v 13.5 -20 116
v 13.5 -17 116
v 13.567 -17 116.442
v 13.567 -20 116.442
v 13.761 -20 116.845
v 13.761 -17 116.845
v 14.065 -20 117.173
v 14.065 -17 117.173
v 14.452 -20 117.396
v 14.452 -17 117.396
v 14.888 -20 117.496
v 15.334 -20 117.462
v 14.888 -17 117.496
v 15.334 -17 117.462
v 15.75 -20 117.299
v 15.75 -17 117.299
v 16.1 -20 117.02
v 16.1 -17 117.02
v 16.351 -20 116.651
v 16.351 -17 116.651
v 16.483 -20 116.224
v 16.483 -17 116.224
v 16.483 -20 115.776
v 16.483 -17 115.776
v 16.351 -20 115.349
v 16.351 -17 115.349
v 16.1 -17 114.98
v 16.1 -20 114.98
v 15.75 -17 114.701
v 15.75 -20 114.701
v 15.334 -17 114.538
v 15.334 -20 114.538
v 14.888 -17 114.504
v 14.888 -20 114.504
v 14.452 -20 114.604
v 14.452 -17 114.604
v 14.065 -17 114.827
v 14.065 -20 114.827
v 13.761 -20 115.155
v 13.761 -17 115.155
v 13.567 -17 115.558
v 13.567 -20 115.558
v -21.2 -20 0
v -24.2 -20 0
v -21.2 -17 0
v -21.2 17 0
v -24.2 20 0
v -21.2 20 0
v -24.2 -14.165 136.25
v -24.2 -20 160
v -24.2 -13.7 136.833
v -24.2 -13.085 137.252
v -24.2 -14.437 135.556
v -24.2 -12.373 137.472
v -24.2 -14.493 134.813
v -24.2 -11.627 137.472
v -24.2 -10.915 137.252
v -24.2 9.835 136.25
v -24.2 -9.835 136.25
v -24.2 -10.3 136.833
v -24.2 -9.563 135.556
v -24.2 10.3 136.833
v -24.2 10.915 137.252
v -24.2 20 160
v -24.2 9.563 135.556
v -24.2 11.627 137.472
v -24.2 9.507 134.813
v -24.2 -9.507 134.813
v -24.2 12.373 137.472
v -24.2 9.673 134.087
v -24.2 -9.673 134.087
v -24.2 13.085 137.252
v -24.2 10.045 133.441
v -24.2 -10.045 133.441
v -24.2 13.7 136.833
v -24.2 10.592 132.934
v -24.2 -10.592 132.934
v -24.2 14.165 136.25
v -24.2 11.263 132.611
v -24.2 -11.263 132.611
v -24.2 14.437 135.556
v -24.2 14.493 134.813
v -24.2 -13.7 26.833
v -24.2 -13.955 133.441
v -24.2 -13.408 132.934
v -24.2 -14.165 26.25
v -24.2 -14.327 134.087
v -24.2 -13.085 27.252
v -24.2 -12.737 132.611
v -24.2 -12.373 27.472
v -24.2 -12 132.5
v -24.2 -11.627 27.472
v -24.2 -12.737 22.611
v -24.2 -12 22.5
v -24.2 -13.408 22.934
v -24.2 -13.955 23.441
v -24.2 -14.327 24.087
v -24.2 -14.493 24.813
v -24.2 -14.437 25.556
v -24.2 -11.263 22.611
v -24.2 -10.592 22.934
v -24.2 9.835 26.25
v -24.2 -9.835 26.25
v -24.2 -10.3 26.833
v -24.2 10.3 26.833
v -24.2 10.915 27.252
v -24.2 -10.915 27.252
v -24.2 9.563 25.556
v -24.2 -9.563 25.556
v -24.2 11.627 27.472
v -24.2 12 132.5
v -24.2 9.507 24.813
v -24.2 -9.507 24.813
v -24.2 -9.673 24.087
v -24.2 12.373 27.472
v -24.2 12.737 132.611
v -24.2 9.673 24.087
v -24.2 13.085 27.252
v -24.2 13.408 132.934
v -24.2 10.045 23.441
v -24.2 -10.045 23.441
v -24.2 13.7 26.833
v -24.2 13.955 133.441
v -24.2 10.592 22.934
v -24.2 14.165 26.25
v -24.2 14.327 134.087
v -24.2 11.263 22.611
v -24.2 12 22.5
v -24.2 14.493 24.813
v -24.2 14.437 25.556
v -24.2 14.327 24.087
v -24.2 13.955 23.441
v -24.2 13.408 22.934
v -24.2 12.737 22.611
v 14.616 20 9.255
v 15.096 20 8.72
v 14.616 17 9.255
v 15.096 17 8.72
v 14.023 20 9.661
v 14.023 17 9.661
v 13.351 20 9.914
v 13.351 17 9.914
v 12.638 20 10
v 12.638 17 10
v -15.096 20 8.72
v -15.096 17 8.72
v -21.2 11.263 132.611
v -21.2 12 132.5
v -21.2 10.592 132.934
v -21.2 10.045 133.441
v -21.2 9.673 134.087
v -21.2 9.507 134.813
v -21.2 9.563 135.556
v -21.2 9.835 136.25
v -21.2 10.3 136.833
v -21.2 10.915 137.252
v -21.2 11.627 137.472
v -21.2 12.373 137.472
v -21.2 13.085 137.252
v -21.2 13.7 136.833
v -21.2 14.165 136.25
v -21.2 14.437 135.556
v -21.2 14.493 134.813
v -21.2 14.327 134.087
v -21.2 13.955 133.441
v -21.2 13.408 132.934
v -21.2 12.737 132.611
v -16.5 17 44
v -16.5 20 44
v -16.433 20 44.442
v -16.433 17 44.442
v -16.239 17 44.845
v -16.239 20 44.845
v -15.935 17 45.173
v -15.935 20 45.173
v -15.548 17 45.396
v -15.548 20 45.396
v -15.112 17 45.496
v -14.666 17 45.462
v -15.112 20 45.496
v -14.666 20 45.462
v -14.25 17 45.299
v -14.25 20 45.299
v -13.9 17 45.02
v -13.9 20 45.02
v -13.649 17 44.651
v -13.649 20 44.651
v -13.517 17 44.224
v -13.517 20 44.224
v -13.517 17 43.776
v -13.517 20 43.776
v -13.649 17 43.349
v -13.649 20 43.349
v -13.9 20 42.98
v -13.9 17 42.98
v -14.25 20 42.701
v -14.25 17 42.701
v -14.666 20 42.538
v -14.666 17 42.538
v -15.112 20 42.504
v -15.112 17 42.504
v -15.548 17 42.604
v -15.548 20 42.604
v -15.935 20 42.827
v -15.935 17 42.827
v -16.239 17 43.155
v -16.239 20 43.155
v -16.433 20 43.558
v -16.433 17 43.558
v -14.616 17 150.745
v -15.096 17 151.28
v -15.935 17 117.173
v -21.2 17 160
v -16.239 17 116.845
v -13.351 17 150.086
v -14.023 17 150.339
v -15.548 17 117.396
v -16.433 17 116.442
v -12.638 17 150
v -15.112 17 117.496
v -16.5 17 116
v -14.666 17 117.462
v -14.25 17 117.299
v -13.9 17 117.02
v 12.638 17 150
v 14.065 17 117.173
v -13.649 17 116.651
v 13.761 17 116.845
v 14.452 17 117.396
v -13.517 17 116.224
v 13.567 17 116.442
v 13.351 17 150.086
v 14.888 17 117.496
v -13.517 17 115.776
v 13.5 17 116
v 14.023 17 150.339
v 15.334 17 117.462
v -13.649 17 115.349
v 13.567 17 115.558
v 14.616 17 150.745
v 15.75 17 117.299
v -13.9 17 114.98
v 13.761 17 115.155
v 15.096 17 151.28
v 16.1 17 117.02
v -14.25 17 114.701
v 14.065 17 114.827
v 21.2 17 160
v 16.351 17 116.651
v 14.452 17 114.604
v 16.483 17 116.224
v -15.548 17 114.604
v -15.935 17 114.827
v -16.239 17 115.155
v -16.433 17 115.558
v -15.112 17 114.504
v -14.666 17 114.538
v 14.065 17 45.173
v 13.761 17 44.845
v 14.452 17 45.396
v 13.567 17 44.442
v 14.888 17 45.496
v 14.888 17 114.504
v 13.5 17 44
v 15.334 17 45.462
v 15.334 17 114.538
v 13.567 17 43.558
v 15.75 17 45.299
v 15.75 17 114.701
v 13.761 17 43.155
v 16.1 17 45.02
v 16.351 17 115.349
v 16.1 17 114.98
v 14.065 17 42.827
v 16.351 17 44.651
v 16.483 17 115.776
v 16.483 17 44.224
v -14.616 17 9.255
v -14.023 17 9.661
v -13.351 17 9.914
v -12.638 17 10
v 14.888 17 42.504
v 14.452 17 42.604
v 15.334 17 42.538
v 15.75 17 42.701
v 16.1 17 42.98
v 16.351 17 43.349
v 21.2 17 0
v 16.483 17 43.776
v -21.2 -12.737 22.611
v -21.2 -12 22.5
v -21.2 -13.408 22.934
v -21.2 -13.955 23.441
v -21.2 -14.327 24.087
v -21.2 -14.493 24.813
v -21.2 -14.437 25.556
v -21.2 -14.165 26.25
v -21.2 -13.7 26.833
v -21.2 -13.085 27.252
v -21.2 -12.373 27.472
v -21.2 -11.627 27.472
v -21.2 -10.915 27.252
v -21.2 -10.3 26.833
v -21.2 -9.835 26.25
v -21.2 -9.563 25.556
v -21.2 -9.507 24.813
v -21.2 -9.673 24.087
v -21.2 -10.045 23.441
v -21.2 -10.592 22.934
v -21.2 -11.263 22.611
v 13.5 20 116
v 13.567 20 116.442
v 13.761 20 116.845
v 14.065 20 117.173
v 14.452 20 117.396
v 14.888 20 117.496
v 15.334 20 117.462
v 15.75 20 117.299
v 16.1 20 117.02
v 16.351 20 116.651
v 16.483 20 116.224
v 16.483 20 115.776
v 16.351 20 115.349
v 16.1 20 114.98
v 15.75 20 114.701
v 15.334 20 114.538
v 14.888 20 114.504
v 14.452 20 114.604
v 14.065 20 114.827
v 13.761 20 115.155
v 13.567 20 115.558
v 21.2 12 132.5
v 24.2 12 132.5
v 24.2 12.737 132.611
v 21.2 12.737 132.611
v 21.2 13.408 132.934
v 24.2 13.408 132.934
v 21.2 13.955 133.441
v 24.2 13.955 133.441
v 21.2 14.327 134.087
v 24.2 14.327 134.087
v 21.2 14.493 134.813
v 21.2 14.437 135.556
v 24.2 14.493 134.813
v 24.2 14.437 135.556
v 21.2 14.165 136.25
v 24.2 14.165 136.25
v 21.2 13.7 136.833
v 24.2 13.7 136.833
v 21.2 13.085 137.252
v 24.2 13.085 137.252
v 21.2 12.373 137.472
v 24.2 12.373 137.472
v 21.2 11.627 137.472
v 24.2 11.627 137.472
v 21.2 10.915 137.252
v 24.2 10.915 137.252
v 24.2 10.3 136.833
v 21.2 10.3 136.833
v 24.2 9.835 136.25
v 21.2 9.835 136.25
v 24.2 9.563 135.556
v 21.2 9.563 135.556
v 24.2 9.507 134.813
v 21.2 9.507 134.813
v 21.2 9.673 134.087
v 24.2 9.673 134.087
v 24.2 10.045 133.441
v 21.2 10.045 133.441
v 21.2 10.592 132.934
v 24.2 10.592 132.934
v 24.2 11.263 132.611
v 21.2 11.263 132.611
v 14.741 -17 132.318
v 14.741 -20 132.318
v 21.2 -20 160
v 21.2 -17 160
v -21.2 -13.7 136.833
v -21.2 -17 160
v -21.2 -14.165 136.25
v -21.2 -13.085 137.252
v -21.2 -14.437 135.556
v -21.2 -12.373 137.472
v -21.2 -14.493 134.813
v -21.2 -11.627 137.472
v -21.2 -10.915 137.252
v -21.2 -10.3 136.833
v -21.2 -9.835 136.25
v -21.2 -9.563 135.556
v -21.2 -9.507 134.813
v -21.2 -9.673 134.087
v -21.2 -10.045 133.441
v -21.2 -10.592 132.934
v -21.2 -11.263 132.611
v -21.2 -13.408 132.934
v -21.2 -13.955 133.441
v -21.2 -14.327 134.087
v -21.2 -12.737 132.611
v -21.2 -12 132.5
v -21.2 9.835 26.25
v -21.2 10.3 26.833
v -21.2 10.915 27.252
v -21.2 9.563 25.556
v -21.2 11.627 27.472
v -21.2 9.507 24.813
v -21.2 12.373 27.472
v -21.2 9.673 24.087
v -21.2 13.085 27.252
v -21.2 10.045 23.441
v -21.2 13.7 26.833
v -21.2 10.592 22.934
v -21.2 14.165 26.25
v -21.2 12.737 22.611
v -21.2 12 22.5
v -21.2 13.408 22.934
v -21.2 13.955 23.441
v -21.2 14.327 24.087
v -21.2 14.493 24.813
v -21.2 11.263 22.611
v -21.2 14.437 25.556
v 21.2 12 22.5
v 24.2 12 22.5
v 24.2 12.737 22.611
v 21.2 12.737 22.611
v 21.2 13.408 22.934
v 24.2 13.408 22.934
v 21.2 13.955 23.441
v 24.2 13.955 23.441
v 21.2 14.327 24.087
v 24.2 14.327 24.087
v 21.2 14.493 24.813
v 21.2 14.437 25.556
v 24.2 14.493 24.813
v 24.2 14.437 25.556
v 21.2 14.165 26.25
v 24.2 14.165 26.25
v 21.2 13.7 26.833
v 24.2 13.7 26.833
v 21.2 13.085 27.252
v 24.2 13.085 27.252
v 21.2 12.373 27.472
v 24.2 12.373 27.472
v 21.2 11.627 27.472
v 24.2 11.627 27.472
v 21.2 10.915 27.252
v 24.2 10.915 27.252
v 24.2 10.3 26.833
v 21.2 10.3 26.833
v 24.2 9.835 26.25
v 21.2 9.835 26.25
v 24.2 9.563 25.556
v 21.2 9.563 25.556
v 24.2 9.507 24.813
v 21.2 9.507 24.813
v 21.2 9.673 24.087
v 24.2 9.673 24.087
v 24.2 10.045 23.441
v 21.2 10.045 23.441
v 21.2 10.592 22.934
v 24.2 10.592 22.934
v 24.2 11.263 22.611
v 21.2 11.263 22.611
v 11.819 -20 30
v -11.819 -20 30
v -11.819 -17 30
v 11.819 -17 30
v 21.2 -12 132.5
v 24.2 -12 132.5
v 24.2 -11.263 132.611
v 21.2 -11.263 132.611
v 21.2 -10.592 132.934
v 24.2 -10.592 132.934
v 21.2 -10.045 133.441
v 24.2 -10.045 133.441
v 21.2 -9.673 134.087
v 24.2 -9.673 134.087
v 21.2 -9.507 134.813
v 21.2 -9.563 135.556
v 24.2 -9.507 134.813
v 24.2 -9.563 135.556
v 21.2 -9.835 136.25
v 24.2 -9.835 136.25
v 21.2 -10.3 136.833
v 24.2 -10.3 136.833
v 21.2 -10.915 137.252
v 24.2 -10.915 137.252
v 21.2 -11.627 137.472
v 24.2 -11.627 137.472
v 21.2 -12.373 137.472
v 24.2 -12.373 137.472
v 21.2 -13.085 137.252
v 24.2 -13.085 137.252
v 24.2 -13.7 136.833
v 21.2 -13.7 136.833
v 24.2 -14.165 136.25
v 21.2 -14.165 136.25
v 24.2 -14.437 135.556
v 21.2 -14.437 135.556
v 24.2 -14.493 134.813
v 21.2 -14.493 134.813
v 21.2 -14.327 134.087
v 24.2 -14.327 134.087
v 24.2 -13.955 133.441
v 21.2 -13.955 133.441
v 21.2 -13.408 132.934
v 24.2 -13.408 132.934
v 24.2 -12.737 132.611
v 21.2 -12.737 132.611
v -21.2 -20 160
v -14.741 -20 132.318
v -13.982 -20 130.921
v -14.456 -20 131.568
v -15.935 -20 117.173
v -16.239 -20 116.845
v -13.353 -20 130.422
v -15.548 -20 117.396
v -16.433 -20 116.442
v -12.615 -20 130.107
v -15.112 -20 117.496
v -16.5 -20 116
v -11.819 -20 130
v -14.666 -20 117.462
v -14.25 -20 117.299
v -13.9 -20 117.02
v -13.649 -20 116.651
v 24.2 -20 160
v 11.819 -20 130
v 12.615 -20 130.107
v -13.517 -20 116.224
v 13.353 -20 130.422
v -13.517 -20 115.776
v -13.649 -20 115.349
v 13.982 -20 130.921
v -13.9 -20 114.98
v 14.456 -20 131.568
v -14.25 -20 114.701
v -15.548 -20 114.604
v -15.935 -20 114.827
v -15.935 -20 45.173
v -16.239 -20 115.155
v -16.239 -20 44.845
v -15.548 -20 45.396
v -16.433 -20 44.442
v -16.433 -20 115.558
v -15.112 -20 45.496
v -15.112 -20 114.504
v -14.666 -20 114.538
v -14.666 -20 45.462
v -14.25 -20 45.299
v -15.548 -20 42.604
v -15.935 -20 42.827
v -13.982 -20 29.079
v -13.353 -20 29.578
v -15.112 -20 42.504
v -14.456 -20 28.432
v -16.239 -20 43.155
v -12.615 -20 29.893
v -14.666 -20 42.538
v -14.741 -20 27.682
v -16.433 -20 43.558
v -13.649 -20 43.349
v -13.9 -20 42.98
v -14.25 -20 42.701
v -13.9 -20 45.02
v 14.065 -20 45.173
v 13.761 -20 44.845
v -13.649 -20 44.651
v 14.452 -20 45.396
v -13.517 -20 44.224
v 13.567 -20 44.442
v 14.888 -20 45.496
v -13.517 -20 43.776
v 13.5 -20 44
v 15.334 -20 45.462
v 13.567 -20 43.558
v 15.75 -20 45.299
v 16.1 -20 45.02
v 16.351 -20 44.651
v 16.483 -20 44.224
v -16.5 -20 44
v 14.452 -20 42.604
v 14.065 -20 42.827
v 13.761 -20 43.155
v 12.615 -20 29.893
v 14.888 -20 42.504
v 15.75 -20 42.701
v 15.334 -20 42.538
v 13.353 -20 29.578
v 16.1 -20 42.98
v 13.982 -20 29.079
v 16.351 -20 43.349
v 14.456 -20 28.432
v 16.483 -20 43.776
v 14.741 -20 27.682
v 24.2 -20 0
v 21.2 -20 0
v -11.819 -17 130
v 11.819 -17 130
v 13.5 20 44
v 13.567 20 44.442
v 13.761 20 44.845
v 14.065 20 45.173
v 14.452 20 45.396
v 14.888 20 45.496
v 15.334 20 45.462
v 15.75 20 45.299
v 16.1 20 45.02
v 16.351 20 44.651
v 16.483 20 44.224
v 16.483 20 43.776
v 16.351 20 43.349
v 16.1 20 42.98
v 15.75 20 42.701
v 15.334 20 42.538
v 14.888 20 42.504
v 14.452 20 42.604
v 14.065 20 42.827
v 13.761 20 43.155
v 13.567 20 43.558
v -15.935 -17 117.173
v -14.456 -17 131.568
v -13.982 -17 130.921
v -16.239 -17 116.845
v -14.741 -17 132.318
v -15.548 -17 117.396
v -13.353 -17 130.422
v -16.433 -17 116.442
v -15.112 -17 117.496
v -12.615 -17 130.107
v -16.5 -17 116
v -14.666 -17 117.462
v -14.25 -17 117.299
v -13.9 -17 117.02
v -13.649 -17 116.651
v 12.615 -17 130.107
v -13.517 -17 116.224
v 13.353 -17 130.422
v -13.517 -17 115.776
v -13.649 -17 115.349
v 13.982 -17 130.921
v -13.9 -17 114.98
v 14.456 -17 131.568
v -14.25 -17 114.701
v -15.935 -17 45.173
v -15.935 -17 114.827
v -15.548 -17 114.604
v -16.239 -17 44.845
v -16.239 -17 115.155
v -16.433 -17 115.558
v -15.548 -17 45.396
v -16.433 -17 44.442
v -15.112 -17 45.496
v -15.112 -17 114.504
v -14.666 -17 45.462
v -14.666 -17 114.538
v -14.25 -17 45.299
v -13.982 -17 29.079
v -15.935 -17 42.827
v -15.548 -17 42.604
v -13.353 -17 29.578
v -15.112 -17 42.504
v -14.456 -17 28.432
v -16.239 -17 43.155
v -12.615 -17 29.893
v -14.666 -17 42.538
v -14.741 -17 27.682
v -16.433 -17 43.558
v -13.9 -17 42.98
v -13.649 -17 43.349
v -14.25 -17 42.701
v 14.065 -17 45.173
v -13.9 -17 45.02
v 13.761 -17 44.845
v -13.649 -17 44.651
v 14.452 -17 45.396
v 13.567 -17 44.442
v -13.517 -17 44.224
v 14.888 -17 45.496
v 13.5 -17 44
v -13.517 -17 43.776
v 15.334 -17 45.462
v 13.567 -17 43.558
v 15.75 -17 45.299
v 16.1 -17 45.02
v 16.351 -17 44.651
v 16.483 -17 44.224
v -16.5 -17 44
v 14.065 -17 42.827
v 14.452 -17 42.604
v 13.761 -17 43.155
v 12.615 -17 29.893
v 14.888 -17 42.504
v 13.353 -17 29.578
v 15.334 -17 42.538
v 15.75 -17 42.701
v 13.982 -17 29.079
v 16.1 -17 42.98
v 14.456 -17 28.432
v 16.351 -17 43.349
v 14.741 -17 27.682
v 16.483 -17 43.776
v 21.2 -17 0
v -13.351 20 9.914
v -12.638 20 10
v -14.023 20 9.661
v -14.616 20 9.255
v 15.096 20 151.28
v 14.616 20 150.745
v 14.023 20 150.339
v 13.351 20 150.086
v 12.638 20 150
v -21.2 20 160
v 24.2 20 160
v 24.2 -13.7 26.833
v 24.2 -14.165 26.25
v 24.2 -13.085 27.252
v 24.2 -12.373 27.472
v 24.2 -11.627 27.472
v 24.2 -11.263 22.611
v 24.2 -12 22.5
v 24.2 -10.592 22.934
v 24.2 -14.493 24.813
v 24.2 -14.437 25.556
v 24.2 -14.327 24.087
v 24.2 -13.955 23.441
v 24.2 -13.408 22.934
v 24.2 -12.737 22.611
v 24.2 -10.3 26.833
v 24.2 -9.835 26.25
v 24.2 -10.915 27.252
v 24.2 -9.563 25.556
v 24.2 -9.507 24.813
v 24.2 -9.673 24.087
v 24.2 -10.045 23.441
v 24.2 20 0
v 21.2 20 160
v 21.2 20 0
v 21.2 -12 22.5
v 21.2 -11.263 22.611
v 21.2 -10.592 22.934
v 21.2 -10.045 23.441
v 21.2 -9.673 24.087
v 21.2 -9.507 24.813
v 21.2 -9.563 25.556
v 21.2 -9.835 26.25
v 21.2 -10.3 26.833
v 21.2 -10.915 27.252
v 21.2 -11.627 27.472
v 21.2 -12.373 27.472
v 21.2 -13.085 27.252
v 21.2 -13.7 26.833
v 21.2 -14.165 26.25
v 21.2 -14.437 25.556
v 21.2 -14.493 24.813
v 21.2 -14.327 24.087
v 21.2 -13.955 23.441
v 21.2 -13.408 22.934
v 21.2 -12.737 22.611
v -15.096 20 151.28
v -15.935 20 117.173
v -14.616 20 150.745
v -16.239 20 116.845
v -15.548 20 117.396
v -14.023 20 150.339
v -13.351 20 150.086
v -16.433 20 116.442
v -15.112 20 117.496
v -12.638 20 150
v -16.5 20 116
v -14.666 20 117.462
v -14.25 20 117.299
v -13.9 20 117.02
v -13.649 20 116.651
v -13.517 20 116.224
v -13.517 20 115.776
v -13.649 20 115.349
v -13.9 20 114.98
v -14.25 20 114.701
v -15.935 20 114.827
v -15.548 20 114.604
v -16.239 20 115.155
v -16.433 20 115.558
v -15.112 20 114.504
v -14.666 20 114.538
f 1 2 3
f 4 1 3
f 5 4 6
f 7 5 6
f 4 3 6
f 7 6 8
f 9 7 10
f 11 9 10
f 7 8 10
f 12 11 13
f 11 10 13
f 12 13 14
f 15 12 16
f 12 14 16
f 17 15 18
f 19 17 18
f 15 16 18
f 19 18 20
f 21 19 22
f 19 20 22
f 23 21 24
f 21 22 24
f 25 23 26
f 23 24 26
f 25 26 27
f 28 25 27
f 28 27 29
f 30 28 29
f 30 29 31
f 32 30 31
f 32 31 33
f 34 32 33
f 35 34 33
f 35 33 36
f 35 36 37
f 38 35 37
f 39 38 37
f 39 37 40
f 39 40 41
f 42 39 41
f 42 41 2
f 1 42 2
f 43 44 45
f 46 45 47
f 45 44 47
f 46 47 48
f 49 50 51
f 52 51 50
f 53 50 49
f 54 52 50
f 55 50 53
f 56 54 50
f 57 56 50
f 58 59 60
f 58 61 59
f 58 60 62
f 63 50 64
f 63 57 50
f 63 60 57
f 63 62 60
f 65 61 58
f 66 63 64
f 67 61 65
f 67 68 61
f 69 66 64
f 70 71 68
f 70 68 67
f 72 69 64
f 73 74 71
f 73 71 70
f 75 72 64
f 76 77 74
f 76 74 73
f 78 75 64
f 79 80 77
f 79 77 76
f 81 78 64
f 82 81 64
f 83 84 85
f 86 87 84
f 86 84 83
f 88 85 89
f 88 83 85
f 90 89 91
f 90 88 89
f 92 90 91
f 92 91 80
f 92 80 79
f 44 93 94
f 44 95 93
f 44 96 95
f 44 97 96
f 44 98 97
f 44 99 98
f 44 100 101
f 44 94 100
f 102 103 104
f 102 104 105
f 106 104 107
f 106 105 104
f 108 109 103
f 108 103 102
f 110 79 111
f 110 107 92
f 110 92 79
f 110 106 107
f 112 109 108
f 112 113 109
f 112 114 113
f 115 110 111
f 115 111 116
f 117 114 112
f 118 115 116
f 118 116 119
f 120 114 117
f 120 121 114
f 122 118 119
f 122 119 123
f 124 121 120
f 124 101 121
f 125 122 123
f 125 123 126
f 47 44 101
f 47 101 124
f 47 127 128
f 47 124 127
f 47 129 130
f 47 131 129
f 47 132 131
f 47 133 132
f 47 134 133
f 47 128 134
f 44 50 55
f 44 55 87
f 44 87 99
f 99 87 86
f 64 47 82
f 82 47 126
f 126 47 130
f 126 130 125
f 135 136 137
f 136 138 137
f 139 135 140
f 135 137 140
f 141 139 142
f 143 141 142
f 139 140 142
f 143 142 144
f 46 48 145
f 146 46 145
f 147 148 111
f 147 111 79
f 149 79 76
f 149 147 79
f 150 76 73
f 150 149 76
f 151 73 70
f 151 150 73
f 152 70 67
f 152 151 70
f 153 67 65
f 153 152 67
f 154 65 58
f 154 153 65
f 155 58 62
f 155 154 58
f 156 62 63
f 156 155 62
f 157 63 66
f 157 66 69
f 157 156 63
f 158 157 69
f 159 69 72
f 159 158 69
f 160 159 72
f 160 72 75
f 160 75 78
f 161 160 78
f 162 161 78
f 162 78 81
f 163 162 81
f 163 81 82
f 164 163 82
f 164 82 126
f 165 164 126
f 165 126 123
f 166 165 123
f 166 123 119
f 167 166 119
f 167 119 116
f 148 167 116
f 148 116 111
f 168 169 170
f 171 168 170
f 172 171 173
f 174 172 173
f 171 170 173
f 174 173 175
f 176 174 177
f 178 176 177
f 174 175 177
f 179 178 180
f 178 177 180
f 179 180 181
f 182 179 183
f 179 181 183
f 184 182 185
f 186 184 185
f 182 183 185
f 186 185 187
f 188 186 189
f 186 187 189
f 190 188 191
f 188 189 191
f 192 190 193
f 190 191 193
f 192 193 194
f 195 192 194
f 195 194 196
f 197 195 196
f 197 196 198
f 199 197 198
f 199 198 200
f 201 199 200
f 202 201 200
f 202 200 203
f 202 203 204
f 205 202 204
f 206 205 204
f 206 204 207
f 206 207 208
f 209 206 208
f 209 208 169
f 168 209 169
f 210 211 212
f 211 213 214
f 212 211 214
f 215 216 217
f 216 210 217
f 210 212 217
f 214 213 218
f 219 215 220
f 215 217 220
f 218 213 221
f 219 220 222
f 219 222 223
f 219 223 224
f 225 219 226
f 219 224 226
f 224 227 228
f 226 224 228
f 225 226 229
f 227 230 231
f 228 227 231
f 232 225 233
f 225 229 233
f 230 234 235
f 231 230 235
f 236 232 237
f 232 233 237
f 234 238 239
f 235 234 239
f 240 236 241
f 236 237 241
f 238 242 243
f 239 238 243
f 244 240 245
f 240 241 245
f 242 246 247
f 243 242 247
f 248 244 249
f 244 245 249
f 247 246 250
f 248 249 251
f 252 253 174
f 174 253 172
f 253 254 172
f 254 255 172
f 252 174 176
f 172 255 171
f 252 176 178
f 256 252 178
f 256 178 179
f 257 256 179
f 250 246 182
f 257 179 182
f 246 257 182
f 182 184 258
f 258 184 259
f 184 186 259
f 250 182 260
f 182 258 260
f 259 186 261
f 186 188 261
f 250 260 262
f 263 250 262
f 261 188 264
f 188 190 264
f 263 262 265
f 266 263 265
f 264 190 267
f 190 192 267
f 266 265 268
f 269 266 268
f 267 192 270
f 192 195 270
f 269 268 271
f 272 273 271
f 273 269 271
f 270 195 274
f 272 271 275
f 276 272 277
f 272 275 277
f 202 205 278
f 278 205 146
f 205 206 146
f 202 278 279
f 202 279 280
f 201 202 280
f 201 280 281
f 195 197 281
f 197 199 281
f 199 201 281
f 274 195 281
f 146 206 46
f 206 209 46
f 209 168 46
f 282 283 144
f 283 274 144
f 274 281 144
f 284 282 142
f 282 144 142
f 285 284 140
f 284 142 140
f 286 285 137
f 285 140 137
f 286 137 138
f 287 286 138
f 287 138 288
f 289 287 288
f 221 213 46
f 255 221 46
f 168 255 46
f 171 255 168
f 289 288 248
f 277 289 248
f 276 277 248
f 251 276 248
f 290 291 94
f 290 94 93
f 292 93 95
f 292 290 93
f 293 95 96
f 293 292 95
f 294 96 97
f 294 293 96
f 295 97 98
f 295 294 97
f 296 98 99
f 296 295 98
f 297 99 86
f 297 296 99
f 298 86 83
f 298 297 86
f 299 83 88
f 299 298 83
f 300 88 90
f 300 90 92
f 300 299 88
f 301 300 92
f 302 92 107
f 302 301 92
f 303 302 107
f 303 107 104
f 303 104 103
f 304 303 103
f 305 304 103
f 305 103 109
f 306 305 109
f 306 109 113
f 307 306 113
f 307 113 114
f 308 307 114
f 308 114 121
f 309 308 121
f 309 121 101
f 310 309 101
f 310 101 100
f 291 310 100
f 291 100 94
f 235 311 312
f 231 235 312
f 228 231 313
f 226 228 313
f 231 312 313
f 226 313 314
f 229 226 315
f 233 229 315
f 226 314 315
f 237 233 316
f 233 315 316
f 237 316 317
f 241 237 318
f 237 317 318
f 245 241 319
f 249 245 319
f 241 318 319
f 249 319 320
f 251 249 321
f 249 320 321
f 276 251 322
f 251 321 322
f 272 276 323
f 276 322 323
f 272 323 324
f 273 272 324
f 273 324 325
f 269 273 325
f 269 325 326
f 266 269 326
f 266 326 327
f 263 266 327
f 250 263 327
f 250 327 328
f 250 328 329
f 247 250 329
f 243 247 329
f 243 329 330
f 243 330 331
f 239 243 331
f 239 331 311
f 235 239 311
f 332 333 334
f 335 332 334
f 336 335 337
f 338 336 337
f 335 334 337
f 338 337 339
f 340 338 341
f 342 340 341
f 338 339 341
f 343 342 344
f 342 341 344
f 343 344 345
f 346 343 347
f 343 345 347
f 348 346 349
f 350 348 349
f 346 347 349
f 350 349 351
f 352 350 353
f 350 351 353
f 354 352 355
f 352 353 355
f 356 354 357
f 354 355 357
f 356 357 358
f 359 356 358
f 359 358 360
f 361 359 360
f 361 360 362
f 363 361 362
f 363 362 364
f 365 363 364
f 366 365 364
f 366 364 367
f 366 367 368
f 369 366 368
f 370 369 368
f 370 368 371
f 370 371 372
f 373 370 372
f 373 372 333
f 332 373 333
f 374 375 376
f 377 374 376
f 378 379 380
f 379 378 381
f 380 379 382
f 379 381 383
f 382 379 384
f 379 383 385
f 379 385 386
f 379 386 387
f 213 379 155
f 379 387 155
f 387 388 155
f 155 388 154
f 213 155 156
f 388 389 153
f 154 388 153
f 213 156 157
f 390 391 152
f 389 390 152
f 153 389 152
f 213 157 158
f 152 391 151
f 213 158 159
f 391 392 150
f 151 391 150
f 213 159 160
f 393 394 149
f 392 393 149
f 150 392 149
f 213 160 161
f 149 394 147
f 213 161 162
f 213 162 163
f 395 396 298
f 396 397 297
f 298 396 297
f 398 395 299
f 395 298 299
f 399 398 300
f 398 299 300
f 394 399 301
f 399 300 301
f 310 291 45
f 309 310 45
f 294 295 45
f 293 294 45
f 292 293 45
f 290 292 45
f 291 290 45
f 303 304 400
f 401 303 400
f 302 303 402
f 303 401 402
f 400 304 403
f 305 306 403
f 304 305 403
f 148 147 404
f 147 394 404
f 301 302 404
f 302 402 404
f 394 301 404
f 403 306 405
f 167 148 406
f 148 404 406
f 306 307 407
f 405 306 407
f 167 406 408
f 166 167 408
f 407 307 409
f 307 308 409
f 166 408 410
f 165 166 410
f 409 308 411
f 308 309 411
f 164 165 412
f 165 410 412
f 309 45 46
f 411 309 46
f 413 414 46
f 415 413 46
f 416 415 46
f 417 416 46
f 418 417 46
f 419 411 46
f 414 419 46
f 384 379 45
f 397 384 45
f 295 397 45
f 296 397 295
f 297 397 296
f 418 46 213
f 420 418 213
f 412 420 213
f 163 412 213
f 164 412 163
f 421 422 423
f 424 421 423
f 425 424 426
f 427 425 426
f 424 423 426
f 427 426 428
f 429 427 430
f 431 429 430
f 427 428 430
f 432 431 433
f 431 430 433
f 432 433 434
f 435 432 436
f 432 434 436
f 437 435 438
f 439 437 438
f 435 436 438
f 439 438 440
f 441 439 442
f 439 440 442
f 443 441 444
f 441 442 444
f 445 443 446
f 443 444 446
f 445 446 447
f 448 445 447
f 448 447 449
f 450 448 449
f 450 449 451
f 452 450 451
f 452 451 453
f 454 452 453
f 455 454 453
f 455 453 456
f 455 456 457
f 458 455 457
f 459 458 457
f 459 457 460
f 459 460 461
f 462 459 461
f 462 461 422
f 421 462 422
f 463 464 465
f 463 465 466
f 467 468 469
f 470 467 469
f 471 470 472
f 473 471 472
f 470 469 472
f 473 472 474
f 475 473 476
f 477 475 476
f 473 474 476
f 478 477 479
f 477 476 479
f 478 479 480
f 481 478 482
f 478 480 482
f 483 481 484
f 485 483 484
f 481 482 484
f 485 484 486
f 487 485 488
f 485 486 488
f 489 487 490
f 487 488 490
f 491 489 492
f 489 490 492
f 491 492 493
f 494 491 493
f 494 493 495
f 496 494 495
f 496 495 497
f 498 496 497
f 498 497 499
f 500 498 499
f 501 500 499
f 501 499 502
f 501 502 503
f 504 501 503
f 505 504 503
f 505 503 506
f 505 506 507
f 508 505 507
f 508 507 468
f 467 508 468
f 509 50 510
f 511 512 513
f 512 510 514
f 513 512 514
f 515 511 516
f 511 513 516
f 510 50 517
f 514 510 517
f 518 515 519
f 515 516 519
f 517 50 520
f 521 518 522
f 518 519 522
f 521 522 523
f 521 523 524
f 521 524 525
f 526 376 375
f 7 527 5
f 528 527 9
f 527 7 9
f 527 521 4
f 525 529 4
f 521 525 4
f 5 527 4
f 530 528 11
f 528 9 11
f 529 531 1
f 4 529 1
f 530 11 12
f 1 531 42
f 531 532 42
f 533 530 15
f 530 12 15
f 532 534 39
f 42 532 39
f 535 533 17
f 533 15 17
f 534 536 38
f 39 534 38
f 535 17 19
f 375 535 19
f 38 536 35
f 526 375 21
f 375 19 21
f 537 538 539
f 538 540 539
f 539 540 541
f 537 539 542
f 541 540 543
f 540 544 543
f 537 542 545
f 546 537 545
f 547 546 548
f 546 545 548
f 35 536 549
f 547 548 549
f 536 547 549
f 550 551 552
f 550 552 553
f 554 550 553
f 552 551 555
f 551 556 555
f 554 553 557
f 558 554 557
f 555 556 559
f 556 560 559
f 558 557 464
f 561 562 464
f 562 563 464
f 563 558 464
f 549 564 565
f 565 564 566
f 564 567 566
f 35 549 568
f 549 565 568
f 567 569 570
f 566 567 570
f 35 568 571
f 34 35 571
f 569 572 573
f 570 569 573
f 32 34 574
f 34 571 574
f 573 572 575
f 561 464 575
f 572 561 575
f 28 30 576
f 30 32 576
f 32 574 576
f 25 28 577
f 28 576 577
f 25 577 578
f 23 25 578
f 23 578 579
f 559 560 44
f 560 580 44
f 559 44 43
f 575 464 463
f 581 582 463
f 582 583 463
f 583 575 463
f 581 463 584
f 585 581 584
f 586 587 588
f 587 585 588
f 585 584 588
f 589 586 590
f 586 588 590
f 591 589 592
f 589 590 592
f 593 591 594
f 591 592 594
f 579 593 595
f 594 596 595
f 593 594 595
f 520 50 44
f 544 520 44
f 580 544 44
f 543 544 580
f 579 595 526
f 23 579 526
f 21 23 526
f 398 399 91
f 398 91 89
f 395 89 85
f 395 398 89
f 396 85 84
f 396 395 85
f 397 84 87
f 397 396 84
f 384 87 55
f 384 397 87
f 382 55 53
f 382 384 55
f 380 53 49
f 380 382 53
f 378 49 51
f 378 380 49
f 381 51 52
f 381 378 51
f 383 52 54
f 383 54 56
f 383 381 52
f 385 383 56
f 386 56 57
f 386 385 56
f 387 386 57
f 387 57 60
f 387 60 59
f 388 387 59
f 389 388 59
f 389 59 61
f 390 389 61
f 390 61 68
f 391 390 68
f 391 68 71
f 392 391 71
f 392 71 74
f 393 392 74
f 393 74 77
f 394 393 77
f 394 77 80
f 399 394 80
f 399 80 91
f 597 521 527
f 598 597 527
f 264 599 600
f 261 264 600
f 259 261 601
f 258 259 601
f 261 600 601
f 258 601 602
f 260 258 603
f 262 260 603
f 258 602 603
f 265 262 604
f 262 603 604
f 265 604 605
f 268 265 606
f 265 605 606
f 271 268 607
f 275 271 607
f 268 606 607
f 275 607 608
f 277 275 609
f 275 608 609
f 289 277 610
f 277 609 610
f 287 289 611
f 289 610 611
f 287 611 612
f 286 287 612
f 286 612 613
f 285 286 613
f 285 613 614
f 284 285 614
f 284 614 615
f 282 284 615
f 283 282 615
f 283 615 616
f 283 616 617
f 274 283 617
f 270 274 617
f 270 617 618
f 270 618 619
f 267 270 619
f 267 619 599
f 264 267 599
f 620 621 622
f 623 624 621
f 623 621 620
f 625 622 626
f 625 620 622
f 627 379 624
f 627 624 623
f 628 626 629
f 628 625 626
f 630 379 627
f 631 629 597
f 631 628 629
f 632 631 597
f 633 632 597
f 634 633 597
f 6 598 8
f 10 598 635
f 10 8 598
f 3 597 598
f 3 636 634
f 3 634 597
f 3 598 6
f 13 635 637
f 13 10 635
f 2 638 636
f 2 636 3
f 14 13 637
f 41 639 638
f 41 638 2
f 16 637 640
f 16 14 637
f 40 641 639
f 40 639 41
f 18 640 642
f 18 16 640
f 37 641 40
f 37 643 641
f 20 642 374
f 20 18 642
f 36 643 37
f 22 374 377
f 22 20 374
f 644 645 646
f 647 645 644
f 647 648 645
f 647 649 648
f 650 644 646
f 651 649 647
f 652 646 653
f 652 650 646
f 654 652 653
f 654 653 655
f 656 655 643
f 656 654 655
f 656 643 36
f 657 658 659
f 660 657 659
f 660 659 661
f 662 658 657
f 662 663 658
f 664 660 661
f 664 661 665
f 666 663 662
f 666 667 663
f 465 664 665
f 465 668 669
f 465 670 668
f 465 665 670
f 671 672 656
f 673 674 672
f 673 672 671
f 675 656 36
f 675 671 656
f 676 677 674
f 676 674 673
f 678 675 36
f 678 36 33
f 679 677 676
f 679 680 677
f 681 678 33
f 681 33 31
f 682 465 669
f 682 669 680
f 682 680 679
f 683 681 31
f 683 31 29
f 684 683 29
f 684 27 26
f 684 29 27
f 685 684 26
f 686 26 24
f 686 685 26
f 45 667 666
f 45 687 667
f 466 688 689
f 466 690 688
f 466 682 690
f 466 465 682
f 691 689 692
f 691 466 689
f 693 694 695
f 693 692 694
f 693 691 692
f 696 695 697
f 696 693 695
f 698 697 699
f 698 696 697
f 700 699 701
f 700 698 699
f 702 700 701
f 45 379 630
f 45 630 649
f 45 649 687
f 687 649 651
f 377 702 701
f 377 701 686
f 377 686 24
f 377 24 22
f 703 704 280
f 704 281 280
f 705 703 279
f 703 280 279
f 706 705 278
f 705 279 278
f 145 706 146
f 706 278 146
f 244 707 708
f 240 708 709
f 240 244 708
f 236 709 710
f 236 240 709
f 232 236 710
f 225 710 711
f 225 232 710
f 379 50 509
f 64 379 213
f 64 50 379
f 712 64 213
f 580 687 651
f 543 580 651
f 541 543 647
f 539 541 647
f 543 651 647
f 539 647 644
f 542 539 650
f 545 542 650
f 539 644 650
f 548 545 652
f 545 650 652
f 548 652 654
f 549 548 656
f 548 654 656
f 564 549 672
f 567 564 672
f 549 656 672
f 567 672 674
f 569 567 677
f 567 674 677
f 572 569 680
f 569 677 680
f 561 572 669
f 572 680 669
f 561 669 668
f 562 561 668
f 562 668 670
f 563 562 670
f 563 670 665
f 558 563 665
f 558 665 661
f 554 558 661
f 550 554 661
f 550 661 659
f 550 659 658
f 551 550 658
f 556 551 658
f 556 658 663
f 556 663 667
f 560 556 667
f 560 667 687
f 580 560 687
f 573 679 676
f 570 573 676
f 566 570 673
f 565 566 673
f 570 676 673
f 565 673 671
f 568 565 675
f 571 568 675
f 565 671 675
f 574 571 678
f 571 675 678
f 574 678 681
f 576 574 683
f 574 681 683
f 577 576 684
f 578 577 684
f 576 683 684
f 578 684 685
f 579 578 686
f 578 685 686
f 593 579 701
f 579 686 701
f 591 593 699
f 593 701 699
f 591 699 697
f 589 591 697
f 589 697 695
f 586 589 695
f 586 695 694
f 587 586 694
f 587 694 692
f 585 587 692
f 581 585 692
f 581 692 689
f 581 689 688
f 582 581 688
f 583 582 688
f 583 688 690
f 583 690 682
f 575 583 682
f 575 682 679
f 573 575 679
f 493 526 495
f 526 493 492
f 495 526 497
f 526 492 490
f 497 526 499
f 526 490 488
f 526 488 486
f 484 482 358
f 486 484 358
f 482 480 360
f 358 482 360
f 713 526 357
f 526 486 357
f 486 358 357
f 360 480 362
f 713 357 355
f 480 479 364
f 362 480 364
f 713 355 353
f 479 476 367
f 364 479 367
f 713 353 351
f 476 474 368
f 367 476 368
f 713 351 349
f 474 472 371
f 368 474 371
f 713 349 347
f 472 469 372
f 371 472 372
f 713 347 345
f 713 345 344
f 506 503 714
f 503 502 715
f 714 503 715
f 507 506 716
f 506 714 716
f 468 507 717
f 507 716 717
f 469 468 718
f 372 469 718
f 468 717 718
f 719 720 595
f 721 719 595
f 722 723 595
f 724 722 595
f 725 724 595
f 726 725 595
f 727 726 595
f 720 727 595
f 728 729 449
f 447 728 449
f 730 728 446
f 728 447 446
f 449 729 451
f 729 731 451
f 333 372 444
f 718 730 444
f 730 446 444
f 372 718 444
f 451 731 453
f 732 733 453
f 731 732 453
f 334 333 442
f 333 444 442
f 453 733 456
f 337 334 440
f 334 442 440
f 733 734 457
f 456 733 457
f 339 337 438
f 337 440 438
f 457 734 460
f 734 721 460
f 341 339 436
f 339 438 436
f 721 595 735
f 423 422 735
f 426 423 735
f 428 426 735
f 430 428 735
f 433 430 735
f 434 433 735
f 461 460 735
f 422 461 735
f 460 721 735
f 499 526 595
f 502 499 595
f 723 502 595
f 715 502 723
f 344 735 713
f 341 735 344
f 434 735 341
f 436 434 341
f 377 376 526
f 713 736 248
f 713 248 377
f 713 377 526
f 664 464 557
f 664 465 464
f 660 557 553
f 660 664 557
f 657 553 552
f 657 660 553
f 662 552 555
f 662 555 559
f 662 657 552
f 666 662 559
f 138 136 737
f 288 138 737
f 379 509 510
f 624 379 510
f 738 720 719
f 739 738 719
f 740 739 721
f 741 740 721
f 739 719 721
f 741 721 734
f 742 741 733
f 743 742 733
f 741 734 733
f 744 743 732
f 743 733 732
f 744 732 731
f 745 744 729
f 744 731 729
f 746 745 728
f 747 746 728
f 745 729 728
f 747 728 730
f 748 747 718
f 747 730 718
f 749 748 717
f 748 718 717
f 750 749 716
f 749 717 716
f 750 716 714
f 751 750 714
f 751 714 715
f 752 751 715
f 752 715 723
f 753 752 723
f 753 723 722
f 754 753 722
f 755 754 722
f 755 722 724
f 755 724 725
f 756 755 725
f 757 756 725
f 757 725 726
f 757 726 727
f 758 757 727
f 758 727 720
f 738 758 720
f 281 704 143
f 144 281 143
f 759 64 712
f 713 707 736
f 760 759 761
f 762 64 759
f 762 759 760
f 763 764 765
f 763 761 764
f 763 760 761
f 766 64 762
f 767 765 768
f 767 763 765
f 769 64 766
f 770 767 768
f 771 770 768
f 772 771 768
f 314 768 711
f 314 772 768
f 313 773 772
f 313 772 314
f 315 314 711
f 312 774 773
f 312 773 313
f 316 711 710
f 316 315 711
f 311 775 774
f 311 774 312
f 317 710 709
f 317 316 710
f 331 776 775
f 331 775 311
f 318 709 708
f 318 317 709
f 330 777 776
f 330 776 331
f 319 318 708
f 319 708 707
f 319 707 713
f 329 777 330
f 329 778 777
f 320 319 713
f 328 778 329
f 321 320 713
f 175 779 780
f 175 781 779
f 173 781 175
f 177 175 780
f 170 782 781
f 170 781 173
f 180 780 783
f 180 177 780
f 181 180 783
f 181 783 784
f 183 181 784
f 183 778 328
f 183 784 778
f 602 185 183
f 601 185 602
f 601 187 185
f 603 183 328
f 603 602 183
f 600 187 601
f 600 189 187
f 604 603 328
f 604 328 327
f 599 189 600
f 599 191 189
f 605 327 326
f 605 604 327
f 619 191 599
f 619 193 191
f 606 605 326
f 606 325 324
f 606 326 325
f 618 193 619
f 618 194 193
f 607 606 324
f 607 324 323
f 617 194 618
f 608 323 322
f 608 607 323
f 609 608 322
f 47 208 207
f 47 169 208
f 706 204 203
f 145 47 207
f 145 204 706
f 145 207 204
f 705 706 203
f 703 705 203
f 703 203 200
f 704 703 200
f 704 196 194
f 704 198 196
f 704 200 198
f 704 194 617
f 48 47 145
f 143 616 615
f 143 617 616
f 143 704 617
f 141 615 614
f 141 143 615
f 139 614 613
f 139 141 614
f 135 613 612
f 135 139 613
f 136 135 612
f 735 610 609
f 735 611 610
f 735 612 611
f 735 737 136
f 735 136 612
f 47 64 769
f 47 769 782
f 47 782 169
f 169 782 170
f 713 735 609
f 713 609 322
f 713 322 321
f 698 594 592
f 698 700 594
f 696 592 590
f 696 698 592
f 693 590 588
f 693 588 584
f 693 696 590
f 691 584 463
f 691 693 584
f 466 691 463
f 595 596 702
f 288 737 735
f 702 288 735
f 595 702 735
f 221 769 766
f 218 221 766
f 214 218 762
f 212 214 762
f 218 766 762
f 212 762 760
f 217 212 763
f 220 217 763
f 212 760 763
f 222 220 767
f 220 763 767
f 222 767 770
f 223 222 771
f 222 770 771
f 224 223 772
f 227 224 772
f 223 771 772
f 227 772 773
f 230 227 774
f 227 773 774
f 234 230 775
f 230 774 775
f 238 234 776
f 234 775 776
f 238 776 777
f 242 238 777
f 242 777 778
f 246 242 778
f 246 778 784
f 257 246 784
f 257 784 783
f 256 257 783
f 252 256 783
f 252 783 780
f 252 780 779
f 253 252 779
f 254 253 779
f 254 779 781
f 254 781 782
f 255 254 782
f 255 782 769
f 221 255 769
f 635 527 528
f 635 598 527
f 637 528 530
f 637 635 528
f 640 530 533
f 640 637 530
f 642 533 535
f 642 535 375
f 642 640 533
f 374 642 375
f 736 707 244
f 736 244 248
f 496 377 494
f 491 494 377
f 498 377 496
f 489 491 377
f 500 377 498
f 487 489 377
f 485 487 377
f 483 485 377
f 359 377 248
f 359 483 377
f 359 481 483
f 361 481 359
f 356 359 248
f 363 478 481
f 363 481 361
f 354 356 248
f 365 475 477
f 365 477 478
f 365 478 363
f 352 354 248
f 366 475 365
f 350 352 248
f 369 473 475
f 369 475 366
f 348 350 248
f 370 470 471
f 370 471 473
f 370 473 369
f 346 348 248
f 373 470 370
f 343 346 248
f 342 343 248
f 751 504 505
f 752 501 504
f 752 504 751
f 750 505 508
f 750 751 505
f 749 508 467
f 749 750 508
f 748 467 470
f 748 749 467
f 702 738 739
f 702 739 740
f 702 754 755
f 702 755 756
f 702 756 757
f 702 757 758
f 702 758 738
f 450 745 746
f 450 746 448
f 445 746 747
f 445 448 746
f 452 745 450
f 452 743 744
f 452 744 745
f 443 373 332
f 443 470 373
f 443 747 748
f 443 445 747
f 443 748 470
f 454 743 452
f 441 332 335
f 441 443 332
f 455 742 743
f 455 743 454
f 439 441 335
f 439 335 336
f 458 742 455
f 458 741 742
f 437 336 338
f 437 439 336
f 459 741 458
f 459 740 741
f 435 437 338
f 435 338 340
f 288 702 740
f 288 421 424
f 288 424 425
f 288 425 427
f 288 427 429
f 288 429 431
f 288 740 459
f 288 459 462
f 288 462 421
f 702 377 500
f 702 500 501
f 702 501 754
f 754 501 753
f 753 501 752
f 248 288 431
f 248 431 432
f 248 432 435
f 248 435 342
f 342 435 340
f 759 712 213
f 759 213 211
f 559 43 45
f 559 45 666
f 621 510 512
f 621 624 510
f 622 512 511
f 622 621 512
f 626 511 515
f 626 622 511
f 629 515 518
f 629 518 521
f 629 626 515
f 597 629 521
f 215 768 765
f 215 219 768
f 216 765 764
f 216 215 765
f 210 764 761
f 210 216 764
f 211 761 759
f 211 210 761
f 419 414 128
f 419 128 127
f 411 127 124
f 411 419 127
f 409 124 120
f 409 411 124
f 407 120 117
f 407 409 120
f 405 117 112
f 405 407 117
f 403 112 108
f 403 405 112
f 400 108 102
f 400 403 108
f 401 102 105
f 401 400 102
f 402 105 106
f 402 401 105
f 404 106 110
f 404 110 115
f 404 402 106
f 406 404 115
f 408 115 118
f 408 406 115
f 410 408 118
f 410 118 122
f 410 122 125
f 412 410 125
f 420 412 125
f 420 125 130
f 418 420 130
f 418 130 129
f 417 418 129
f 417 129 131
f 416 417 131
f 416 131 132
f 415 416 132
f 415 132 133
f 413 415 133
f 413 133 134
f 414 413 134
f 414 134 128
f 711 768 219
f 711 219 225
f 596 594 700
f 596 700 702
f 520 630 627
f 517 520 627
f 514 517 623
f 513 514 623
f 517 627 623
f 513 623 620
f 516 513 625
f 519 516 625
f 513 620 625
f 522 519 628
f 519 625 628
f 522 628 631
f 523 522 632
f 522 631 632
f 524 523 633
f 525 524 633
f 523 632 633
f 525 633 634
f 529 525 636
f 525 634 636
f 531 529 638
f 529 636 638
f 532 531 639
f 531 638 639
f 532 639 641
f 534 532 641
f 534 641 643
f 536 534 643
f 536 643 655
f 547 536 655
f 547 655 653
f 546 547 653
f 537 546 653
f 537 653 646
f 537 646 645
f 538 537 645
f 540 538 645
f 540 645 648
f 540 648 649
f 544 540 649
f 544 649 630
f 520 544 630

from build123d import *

# Parameters (mm, degrees)
SKETCH_1_W          = 48.4
SKETCH_1_H          = 40
SKETCH_1_W_2        = 42.4
SKETCH_1_H_2        = 34
EXTRUDE_1_DEPTH     = 160
SKETCH_2_R          = 2.5
CUT_EXTRUDE_1_DEPTH = 18
CUT_EXTRUDE_START   = -10
SKETCH_4_R          = 2.5
CUT_EXTRUDE_3_DEPTH = 10
SKETCH_8_R          = 1.5
CUT_EXTRUDE_6_DEPTH = 50
CUT_EXTRUDE_7_DEPTH = 10
FILLET_1_R          = 3
CUT_EXTRUDE_8_DEPTH = 10
FILLET_2_R          = 3


with BuildPart() as part:
    # 草图1 → 凸台-拉伸1 (new body)
    with BuildSketch(Plane.XY):
        Rectangle(SKETCH_1_W, SKETCH_1_H)
        Rectangle(SKETCH_1_W_2, SKETCH_1_H_2, mode=Mode.SUBTRACT)
    extrude(amount=EXTRUDE_1_DEPTH)

    # 草图2 → 切除-拉伸1 (cut)
    with BuildSketch(Plane(origin=(24.2, 0, 0), x_dir=(0, 0, -1), z_dir=(1, 0, 0))):
        with Locations((-135, 12)):
            Circle(SKETCH_2_R)
        with Locations((-135, -12)):
            Circle(SKETCH_2_R)
        with Locations((-25, 12)):
            Circle(SKETCH_2_R)
        with Locations((-25, -12)):
            Circle(SKETCH_2_R)
    extrude(amount=-CUT_EXTRUDE_1_DEPTH, mode=Mode.SUBTRACT)

    # 草图4 → 切除-拉伸3 (cut)
    with BuildSketch(Plane.ZY.offset(24.2).offset(CUT_EXTRUDE_START)):
        with Locations(Location((25, 12, 0), (0, 0, 180))):
            Circle(SKETCH_4_R)
        with Locations(Location((25, -12, 0), (0, 0, 180))):
            Circle(SKETCH_4_R)
        with Locations(Location((135, 12, 0), (0, 0, 180))):
            Circle(SKETCH_4_R)
        with Locations(Location((135, -12, 0), (0, 0, 180))):
            Circle(SKETCH_4_R)
    extrude(amount=CUT_EXTRUDE_3_DEPTH, mode=Mode.SUBTRACT)

    # 草图8 → 切除-拉伸6 (cut)
    with BuildSketch(Plane(origin=(0, 20, 0), x_dir=(1, 0, 0), z_dir=(0, 1, 0))):
        with Locations(Location((-15, -44, 0), (0, 0, 180))):
            Circle(SKETCH_8_R)
        with Locations(Location((15, -44, 0), (0, 0, 180))):
            Circle(SKETCH_8_R)
        with Locations(Location((-15, -116, 0), (0, 0, 180))):
            Circle(SKETCH_8_R)
        with Locations(Location((15, -116, 0), (0, 0, 180))):
            Circle(SKETCH_8_R)
    extrude(amount=-CUT_EXTRUDE_6_DEPTH, mode=Mode.SUBTRACT)

    # 草图9 → 切除-拉伸7 (cut)
    with BuildSketch(Plane.XZ.offset(20)):
        Polygon((-21.2, 160), (-14.2, 130), (14.2, 130), (21.2, 160), align=None)
        Polygon((21.2, 0), (-21.2, 0), (-14.2, 30), (14.2, 30), align=None)
    extrude(amount=-CUT_EXTRUDE_7_DEPTH, mode=Mode.SUBTRACT)

    # 圆角1
    fillet_1_edges = [part.edges().sort_by_distance(p)[0] for p in [
        (14.2, -18.5, 130),
        (-14.2, -18.5, 130),
        (-14.2, -18.5, 30),
        (14.2, -18.5, 30),
    ]]
    fillet(fillet_1_edges, radius=FILLET_1_R)

    # 草图10 → 切除-拉伸8 (cut)
    with BuildSketch(Plane(origin=(0, 20, 0), x_dir=(1, 0, 0), z_dir=(0, 1, 0))):
        Polygon((-21.2, 0), (-14.2, -10), (14.2, -10), (21.2, 0), align=None)
        Polygon((21.2, -160), (-21.2, -160), (-14.2, -150), (14.2, -150), align=None)
    extrude(amount=-CUT_EXTRUDE_8_DEPTH, mode=Mode.SUBTRACT)

    # 圆角2
    fillet_2_edges = [part.edges().sort_by_distance(p)[0] for p in [
        (14.2, 18.5, 10),
        (-14.2, 18.5, 10),
        (14.2, 18.5, 150),
        (-14.2, 18.5, 150),
    ]]
    fillet(fillet_2_edges, radius=FILLET_2_R)


solid = part.part
